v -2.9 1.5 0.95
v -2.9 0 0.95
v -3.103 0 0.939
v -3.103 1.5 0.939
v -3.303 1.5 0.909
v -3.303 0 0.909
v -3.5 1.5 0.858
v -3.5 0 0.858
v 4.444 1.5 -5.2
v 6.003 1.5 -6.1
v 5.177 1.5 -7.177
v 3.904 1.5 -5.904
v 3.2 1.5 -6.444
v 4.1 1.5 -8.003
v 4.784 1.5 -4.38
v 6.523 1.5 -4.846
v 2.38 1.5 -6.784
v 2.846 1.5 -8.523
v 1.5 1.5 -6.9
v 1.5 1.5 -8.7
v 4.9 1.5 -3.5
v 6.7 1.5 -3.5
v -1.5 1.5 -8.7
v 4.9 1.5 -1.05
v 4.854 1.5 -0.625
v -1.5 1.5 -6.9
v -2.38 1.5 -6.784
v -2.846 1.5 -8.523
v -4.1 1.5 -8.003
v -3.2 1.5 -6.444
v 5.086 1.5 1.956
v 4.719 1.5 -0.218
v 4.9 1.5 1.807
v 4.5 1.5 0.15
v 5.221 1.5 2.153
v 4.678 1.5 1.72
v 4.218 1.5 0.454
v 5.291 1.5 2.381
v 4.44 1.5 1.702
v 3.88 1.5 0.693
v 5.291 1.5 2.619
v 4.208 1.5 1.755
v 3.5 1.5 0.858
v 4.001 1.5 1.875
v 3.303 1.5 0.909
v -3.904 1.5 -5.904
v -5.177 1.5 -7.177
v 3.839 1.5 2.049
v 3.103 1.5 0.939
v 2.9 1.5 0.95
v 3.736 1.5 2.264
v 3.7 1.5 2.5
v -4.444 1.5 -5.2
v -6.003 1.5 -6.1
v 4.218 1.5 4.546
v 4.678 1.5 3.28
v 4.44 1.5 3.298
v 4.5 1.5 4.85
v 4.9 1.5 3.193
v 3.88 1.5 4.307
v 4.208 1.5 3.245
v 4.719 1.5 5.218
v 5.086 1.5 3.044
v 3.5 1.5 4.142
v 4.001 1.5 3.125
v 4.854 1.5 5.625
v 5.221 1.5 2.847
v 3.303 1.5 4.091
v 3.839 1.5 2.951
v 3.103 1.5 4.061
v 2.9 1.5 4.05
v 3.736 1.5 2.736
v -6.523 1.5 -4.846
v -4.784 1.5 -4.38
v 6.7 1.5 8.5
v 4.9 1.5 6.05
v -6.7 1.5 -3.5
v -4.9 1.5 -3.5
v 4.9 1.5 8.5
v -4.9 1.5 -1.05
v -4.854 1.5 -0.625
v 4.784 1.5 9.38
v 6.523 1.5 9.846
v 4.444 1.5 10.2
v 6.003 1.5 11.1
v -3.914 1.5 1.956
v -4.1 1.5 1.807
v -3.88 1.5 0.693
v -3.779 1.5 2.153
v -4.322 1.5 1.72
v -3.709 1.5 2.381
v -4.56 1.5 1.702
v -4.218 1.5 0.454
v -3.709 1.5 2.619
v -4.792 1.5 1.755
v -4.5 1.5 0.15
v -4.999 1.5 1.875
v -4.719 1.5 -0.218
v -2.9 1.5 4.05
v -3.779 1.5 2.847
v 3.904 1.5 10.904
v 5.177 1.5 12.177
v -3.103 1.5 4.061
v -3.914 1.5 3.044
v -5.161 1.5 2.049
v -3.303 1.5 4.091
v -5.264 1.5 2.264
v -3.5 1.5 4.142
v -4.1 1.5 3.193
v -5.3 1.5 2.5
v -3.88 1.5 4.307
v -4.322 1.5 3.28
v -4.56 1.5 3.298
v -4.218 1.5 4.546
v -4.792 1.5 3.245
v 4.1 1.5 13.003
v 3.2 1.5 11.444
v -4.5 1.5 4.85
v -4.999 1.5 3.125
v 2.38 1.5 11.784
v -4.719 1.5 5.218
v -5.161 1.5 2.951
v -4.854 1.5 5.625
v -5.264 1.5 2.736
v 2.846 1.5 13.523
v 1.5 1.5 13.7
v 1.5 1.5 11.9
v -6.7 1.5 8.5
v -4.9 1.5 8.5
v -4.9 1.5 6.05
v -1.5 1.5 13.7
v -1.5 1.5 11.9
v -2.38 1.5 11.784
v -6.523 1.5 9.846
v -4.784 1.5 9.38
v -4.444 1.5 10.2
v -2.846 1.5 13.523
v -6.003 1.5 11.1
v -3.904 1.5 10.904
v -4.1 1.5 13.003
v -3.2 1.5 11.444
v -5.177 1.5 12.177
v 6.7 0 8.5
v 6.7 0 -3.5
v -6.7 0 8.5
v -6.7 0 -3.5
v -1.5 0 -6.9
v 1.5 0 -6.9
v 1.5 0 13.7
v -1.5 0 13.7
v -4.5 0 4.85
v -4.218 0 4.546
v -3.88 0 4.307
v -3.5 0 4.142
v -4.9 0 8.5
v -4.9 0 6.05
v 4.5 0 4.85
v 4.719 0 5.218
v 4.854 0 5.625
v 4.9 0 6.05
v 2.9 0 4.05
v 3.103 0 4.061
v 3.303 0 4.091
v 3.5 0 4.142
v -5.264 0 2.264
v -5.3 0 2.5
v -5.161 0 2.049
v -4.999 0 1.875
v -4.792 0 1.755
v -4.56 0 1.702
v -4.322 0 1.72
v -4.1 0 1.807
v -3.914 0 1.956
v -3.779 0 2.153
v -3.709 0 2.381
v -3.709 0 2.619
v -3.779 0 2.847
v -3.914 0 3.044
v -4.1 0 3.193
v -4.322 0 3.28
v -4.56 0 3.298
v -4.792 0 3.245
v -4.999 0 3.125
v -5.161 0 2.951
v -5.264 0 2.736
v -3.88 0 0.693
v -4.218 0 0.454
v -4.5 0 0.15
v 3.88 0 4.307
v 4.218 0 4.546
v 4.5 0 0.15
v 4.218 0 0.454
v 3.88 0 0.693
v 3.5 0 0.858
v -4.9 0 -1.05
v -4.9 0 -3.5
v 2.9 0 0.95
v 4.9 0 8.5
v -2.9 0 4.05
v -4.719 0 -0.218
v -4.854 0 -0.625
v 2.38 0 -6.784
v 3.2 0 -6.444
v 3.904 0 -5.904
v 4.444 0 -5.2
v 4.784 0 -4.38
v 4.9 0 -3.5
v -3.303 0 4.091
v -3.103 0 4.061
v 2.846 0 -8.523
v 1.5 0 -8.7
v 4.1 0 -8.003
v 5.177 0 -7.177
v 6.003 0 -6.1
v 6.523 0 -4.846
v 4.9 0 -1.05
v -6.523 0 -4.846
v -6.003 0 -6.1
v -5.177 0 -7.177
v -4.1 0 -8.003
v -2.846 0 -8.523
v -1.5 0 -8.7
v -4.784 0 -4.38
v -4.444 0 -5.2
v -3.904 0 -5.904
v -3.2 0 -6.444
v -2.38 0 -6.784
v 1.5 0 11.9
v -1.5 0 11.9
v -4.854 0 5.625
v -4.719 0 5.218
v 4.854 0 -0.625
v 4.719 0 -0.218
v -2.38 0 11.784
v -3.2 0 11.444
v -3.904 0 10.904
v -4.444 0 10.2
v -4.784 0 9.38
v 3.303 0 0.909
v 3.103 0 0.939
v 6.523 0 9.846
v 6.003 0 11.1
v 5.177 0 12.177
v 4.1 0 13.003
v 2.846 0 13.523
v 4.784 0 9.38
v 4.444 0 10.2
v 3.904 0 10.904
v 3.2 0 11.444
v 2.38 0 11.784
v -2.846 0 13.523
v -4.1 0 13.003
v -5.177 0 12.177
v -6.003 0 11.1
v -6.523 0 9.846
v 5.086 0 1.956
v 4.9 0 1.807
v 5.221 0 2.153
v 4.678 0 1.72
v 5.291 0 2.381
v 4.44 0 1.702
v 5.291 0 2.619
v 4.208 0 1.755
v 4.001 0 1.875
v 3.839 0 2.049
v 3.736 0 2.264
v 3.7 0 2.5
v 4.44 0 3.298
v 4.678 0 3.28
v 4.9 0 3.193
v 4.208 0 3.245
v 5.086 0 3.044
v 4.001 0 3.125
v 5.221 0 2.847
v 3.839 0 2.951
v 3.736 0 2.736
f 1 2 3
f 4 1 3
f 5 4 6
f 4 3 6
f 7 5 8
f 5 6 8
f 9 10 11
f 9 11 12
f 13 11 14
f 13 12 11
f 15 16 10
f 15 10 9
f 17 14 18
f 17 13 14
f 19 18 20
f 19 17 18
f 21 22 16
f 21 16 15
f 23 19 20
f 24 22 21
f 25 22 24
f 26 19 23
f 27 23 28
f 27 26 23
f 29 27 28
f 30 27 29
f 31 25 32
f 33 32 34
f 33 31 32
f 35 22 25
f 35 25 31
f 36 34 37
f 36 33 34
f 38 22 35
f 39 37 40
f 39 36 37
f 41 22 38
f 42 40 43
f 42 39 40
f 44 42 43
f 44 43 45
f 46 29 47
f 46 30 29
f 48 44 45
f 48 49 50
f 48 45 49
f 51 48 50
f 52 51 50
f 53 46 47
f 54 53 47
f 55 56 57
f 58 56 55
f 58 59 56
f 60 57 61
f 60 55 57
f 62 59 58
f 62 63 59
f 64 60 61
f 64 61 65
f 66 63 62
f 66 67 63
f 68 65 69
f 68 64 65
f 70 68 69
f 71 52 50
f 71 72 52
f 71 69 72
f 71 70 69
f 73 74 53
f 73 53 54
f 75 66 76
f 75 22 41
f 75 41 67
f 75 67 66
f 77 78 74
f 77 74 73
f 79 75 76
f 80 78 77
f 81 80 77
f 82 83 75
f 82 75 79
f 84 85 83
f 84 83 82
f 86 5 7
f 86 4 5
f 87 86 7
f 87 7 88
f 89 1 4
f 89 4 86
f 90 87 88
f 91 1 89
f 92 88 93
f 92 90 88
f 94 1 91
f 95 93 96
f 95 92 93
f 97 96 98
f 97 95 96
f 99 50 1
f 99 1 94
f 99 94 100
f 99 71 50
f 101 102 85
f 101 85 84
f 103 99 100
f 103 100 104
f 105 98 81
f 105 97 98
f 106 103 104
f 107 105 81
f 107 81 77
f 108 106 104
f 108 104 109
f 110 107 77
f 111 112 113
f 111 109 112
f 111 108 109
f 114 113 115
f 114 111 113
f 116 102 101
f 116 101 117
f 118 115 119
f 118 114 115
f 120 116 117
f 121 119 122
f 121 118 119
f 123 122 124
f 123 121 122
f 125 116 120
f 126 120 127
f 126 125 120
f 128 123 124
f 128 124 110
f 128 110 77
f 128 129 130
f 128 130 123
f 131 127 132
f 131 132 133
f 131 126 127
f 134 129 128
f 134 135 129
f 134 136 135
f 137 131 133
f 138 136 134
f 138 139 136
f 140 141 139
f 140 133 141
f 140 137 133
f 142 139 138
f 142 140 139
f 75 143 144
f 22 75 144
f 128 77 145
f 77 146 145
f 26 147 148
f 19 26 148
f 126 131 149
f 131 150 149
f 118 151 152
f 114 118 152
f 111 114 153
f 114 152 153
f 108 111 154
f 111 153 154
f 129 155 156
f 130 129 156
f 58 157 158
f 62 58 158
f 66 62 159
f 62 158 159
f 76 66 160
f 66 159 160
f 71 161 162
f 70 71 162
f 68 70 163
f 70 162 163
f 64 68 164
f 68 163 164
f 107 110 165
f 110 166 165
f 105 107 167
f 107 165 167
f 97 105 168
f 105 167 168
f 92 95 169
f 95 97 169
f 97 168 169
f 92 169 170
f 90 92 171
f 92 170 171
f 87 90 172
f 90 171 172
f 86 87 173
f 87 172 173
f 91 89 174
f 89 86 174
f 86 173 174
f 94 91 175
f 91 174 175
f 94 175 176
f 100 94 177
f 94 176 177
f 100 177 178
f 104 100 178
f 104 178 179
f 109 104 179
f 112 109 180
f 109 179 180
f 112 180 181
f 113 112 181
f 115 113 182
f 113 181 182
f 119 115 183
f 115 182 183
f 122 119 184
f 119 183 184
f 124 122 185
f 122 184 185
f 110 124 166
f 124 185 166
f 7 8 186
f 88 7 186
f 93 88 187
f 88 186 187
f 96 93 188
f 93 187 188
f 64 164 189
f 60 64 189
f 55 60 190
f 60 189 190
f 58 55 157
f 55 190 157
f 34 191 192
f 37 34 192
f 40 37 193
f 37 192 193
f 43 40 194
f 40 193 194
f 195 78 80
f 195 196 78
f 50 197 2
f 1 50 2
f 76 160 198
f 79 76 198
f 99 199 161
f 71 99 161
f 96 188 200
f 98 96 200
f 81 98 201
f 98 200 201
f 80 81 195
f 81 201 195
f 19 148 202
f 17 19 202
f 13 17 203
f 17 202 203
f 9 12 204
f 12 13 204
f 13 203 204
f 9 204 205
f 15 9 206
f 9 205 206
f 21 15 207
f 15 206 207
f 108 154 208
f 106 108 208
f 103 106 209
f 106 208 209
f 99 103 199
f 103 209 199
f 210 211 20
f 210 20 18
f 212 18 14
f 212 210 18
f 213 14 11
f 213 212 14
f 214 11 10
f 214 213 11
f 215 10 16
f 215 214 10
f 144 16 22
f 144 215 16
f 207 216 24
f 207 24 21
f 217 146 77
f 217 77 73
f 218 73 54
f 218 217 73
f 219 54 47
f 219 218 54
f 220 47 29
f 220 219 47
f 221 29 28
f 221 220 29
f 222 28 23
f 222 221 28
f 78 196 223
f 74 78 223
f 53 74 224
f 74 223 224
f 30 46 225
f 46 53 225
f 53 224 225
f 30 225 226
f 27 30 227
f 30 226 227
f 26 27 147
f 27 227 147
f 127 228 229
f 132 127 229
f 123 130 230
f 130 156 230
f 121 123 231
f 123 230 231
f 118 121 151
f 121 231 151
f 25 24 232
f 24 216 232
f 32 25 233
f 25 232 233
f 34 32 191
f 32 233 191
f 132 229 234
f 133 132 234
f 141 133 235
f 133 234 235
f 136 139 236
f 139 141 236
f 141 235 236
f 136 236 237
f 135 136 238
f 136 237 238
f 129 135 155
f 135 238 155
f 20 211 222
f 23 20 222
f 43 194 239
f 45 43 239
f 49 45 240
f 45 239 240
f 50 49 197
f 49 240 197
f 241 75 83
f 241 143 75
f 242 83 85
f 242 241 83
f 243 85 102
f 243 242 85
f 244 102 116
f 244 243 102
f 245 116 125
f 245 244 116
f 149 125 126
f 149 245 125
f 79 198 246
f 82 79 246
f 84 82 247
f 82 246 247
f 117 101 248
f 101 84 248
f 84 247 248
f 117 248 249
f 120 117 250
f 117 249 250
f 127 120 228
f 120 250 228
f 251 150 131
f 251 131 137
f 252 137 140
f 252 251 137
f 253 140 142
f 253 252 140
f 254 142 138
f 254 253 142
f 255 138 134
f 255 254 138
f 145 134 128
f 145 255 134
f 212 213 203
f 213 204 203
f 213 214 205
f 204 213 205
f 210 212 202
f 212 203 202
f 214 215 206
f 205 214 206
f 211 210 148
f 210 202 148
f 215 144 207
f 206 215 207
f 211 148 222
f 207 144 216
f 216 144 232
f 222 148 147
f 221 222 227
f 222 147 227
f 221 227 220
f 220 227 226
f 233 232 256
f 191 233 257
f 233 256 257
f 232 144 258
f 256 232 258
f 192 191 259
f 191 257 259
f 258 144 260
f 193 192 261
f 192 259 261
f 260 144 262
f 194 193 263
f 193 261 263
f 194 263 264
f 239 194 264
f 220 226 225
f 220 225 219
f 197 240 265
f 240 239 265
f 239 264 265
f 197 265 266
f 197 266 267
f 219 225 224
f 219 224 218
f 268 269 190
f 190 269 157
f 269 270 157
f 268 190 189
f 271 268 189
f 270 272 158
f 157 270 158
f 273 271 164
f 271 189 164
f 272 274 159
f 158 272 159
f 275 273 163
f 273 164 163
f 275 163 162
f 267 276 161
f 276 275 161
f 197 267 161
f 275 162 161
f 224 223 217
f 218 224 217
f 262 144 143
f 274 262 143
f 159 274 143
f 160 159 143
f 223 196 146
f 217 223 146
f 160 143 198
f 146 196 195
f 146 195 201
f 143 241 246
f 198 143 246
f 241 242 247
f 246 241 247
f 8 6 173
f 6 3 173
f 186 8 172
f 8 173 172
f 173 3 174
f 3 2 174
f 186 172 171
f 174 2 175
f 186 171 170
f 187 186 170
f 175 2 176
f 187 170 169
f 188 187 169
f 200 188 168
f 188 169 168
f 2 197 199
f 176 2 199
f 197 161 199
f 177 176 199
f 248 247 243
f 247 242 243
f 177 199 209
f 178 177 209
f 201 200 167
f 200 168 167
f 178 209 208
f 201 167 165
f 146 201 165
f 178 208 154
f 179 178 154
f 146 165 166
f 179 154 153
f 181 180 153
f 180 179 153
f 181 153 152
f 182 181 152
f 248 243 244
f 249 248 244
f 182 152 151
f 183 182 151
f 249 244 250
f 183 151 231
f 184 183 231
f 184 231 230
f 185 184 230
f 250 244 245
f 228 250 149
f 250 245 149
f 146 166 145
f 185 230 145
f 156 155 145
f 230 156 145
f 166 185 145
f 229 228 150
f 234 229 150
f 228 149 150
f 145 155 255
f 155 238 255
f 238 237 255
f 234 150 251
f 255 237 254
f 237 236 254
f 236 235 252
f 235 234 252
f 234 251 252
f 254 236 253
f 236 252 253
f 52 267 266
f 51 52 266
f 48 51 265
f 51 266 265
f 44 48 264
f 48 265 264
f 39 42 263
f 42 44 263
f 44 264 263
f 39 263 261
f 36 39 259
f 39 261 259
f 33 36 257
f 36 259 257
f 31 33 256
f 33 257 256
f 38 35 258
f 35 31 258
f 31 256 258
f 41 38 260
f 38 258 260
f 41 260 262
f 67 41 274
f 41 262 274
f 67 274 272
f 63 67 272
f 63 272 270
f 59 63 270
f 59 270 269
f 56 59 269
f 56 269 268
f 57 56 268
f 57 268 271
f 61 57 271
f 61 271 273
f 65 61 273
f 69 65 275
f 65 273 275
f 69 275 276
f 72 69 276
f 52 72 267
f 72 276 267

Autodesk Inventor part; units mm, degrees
ref_plane "YZ Plane" through (0, 0, 0) normal (1, 0, 0) x (0, 1, 0)
ref_plane "XZ Plane" through (0, 0, 0) normal (0, 1, 0) x (-1, 0, 0)
ref_plane "XY Plane" through (0, 0, 0) normal (0, 0, 1) x (1, 0, 0)
sketch "Sketch2" plane through (0, 0, 0) normal (0, 1, 0) x (-1, 0, 0)
  arc A0 (3.5, 8.5) -> (1.5, 10.5) centre (1.5, 8.5) ccw
  arc A1 (1.5, -5.5) -> (3.5, -3.5) centre (1.5, -3.5) ccw
  line L0 (1.5, -5.5) -> (-1.5, -5.5)
  arc A2 (-3.5, -3.5) -> (-1.5, -5.5) centre (-1.5, -3.5) ccw
  arc A3 (-1.5, 10.5) -> (-3.5, 8.5) centre (-1.5, 8.5) ccw
  circle A4 centre (-9.4, -30.5) radius 1.7
  circle A5 centre (9.4, -15) radius 1.7
  circle A6 centre (9.4, 30.5) radius 1.7
  circle A7 centre (-9.4, 30.5) radius 1.7
  circle A8 centre (-9.4, 15) radius 1.7
  circle A9 centre (9.4, 15) radius 1.7
  circle A10 centre (-9.4, -15) radius 1.7
  circle A11 centre (9.4, -30.5) radius 1.7
  line L1 (-13.9, -33.875) -> (-13.9, 33.875)
  line L2 (13.9, -33.875) -> (-13.9, -33.875)
  line L3 (13.9, 33.875) -> (13.9, -33.875)
  line L4 (-13.9, 33.875) -> (13.9, 33.875)
  arc A12 (4.5, 8.5) -> (3.8682, 10.3417) centre (1.5, 8.5) ccw
  line L5 (-1.5, 10.5) -> (1.5, 10.5)
  arc A13 (-4.5, -3.5) -> (-1.5, -6.5) centre (-1.5, -3.5) ccw
  line L6 (-1.5, -6.5) -> (1.5, -6.5)
  arc A14 (1.5, -6.5) -> (4.5, -3.5) centre (1.5, -3.5) ccw
  arc A15 (4.5, 8.5) -> (1.5, 11.5) centre (1.5, 8.5) ccw
  line L7 (1.5, 11.5) -> (-1.5, 11.5)
  arc A16 (-1.5, 11.5) -> (-4.5, 8.5) centre (-1.5, 8.5) ccw
  line L8 (-1.5, 14.1) -> (1.5, 14.1)
  arc A17 (7.1, 8.5) -> (1.5, 14.1) centre (1.5, 8.5) ccw
  line L9 (7.1, 8.5) -> (7.1, -3.5)
  arc A18 (1.5, -9.1) -> (7.1, -3.5) centre (1.5, -3.5) ccw
  line L10 (1.5, -9.1) -> (-1.5, -9.1)
  arc A19 (-7.1, -3.5) -> (-1.5, -9.1) centre (-1.5, -3.5) ccw
  line L11 (-7.1, -3.5) -> (-7.1, 8.5)
  arc A20 (-1.5, 14.1) -> (-7.1, 8.5) centre (-1.5, 8.5) ccw
  line L12 (21.7007, 2.5) -> (-16.6227, 2.5) construction
  line L13 (4.9, 8.5) -> (4.9, 6.0503)
  arc A21 (1.5, -6.9) -> (4.9, -3.5) centre (1.5, -3.5) ccw
  line L14 (1.5, -6.9) -> (-1.5, -6.9)
  arc A22 (-4.9, -3.5) -> (-1.5, -6.9) centre (-1.5, -3.5) ccw
  line L15 (-4.9, 6.0503) -> (-4.9, 8.5)
  arc A23 (-1.5, 11.9) -> (-4.9, 8.5) centre (-1.5, 8.5) ccw
  line L16 (-1.5, 11.9) -> (1.5, 11.9)
  arc A24 (4.9, 8.5) -> (1.5, 11.9) centre (1.5, 8.5) ccw
  line L17 (6.7, -3.5) -> (6.7, 8.5)
  arc A25 (6.7, 8.5) -> (1.5, 13.7) centre (1.5, 8.5) ccw
  line L18 (1.5, 13.7) -> (-1.5, 13.7)
  arc A26 (-1.5, 13.7) -> (-6.7, 8.5) centre (-1.5, 8.5) ccw
  line L19 (-6.7, 8.5) -> (-6.7, -3.5)
  arc A27 (-6.7, -3.5) -> (-1.5, -8.7) centre (-1.5, -3.5) ccw
  line L20 (-1.5, -8.7) -> (1.5, -8.7)
  arc A28 (1.5, -8.7) -> (6.7, -3.5) centre (1.5, -3.5) ccw
  line L21 (2.9, 4.0503) -> (-2.9, 4.0503)
  line L22 (-2.9, 0.9497) -> (2.9, 0.9497)
  arc A29 (2.9, 4.0503) -> (4.9, 6.0503) centre (2.9, 6.0503) ccw
  arc A30 (-4.9, 6.0503) -> (-2.9, 4.0503) centre (-2.9, 6.0503) ccw
  line L23 (-4.9, -1.0503) -> (-4.9, -3.5)
  line L24 (4.9, -3.5) -> (4.9, -1.0503)
  arc A31 (4.9, -1.0503) -> (2.9, 0.9497) centre (2.9, -1.0503) ccw
  arc A32 (-2.9, 0.9497) -> (-4.9, -1.0503) centre (-2.9, -1.0503) ccw
  line L25 (-4.5, 8.5) -> (-4.5, 4.8503)
  line L26 (-4.5, 0.1497) -> (-4.5, -3.5)
  line L27 (-3.5, -3.5) -> (-3.5, 0.8576)
  line L28 (-3.5, 4.1424) -> (-3.5, 8.5)
  line L29 (3.5, 8.5) -> (3.5, 4.1424)
  line L30 (3.5, 0.8576) -> (3.5, -3.5)
  line L31 (4.5, -3.8243) -> (4.5, 0.1497)
  line L32 (4.5, 4.8503) -> (4.5, 8.5)
  line L33 (4.5, -3.5) -> (4.5, 0.1497)
  line L34 (4.5, 4.8503) -> (4.5, 8.5)
  circle A33 centre (-4.5, 2.5) radius 0.8
  circle A34 centre (4.5, 2.5) radius 0.8
  point P0 (0, 0)
  point P1 (0, 0)
  point P2 (2.621, 11.2827)
  point P3 (-2.6275, 11.2989)
  point P4 (3.8682, 10.3417)
  point P5 (4.5, 8.5)
  point P6 (4.5, -3.5)
  dimension "d10" = 2.6
  dimension "d11" = 23.2
  dimension "d12" = 14.2
  dimension "d15" = 23.2
  dimension "d17" = 0.4
  dimension "d18" = 2
  dimension "d19" = 2
  dimension "d20" = 1.6
  dimension "d21" = 1.6
  dimension "d22" = 2.2
  dimension "d23" = 2.2
extrude "Extrusion1" add sketch "Sketch2" along normal blind 1.5 contours A28 L20 A27 L19 A26 L18 A25 L17
equation "\"d23\" = d22"
properties part number "Top Seal 1"
